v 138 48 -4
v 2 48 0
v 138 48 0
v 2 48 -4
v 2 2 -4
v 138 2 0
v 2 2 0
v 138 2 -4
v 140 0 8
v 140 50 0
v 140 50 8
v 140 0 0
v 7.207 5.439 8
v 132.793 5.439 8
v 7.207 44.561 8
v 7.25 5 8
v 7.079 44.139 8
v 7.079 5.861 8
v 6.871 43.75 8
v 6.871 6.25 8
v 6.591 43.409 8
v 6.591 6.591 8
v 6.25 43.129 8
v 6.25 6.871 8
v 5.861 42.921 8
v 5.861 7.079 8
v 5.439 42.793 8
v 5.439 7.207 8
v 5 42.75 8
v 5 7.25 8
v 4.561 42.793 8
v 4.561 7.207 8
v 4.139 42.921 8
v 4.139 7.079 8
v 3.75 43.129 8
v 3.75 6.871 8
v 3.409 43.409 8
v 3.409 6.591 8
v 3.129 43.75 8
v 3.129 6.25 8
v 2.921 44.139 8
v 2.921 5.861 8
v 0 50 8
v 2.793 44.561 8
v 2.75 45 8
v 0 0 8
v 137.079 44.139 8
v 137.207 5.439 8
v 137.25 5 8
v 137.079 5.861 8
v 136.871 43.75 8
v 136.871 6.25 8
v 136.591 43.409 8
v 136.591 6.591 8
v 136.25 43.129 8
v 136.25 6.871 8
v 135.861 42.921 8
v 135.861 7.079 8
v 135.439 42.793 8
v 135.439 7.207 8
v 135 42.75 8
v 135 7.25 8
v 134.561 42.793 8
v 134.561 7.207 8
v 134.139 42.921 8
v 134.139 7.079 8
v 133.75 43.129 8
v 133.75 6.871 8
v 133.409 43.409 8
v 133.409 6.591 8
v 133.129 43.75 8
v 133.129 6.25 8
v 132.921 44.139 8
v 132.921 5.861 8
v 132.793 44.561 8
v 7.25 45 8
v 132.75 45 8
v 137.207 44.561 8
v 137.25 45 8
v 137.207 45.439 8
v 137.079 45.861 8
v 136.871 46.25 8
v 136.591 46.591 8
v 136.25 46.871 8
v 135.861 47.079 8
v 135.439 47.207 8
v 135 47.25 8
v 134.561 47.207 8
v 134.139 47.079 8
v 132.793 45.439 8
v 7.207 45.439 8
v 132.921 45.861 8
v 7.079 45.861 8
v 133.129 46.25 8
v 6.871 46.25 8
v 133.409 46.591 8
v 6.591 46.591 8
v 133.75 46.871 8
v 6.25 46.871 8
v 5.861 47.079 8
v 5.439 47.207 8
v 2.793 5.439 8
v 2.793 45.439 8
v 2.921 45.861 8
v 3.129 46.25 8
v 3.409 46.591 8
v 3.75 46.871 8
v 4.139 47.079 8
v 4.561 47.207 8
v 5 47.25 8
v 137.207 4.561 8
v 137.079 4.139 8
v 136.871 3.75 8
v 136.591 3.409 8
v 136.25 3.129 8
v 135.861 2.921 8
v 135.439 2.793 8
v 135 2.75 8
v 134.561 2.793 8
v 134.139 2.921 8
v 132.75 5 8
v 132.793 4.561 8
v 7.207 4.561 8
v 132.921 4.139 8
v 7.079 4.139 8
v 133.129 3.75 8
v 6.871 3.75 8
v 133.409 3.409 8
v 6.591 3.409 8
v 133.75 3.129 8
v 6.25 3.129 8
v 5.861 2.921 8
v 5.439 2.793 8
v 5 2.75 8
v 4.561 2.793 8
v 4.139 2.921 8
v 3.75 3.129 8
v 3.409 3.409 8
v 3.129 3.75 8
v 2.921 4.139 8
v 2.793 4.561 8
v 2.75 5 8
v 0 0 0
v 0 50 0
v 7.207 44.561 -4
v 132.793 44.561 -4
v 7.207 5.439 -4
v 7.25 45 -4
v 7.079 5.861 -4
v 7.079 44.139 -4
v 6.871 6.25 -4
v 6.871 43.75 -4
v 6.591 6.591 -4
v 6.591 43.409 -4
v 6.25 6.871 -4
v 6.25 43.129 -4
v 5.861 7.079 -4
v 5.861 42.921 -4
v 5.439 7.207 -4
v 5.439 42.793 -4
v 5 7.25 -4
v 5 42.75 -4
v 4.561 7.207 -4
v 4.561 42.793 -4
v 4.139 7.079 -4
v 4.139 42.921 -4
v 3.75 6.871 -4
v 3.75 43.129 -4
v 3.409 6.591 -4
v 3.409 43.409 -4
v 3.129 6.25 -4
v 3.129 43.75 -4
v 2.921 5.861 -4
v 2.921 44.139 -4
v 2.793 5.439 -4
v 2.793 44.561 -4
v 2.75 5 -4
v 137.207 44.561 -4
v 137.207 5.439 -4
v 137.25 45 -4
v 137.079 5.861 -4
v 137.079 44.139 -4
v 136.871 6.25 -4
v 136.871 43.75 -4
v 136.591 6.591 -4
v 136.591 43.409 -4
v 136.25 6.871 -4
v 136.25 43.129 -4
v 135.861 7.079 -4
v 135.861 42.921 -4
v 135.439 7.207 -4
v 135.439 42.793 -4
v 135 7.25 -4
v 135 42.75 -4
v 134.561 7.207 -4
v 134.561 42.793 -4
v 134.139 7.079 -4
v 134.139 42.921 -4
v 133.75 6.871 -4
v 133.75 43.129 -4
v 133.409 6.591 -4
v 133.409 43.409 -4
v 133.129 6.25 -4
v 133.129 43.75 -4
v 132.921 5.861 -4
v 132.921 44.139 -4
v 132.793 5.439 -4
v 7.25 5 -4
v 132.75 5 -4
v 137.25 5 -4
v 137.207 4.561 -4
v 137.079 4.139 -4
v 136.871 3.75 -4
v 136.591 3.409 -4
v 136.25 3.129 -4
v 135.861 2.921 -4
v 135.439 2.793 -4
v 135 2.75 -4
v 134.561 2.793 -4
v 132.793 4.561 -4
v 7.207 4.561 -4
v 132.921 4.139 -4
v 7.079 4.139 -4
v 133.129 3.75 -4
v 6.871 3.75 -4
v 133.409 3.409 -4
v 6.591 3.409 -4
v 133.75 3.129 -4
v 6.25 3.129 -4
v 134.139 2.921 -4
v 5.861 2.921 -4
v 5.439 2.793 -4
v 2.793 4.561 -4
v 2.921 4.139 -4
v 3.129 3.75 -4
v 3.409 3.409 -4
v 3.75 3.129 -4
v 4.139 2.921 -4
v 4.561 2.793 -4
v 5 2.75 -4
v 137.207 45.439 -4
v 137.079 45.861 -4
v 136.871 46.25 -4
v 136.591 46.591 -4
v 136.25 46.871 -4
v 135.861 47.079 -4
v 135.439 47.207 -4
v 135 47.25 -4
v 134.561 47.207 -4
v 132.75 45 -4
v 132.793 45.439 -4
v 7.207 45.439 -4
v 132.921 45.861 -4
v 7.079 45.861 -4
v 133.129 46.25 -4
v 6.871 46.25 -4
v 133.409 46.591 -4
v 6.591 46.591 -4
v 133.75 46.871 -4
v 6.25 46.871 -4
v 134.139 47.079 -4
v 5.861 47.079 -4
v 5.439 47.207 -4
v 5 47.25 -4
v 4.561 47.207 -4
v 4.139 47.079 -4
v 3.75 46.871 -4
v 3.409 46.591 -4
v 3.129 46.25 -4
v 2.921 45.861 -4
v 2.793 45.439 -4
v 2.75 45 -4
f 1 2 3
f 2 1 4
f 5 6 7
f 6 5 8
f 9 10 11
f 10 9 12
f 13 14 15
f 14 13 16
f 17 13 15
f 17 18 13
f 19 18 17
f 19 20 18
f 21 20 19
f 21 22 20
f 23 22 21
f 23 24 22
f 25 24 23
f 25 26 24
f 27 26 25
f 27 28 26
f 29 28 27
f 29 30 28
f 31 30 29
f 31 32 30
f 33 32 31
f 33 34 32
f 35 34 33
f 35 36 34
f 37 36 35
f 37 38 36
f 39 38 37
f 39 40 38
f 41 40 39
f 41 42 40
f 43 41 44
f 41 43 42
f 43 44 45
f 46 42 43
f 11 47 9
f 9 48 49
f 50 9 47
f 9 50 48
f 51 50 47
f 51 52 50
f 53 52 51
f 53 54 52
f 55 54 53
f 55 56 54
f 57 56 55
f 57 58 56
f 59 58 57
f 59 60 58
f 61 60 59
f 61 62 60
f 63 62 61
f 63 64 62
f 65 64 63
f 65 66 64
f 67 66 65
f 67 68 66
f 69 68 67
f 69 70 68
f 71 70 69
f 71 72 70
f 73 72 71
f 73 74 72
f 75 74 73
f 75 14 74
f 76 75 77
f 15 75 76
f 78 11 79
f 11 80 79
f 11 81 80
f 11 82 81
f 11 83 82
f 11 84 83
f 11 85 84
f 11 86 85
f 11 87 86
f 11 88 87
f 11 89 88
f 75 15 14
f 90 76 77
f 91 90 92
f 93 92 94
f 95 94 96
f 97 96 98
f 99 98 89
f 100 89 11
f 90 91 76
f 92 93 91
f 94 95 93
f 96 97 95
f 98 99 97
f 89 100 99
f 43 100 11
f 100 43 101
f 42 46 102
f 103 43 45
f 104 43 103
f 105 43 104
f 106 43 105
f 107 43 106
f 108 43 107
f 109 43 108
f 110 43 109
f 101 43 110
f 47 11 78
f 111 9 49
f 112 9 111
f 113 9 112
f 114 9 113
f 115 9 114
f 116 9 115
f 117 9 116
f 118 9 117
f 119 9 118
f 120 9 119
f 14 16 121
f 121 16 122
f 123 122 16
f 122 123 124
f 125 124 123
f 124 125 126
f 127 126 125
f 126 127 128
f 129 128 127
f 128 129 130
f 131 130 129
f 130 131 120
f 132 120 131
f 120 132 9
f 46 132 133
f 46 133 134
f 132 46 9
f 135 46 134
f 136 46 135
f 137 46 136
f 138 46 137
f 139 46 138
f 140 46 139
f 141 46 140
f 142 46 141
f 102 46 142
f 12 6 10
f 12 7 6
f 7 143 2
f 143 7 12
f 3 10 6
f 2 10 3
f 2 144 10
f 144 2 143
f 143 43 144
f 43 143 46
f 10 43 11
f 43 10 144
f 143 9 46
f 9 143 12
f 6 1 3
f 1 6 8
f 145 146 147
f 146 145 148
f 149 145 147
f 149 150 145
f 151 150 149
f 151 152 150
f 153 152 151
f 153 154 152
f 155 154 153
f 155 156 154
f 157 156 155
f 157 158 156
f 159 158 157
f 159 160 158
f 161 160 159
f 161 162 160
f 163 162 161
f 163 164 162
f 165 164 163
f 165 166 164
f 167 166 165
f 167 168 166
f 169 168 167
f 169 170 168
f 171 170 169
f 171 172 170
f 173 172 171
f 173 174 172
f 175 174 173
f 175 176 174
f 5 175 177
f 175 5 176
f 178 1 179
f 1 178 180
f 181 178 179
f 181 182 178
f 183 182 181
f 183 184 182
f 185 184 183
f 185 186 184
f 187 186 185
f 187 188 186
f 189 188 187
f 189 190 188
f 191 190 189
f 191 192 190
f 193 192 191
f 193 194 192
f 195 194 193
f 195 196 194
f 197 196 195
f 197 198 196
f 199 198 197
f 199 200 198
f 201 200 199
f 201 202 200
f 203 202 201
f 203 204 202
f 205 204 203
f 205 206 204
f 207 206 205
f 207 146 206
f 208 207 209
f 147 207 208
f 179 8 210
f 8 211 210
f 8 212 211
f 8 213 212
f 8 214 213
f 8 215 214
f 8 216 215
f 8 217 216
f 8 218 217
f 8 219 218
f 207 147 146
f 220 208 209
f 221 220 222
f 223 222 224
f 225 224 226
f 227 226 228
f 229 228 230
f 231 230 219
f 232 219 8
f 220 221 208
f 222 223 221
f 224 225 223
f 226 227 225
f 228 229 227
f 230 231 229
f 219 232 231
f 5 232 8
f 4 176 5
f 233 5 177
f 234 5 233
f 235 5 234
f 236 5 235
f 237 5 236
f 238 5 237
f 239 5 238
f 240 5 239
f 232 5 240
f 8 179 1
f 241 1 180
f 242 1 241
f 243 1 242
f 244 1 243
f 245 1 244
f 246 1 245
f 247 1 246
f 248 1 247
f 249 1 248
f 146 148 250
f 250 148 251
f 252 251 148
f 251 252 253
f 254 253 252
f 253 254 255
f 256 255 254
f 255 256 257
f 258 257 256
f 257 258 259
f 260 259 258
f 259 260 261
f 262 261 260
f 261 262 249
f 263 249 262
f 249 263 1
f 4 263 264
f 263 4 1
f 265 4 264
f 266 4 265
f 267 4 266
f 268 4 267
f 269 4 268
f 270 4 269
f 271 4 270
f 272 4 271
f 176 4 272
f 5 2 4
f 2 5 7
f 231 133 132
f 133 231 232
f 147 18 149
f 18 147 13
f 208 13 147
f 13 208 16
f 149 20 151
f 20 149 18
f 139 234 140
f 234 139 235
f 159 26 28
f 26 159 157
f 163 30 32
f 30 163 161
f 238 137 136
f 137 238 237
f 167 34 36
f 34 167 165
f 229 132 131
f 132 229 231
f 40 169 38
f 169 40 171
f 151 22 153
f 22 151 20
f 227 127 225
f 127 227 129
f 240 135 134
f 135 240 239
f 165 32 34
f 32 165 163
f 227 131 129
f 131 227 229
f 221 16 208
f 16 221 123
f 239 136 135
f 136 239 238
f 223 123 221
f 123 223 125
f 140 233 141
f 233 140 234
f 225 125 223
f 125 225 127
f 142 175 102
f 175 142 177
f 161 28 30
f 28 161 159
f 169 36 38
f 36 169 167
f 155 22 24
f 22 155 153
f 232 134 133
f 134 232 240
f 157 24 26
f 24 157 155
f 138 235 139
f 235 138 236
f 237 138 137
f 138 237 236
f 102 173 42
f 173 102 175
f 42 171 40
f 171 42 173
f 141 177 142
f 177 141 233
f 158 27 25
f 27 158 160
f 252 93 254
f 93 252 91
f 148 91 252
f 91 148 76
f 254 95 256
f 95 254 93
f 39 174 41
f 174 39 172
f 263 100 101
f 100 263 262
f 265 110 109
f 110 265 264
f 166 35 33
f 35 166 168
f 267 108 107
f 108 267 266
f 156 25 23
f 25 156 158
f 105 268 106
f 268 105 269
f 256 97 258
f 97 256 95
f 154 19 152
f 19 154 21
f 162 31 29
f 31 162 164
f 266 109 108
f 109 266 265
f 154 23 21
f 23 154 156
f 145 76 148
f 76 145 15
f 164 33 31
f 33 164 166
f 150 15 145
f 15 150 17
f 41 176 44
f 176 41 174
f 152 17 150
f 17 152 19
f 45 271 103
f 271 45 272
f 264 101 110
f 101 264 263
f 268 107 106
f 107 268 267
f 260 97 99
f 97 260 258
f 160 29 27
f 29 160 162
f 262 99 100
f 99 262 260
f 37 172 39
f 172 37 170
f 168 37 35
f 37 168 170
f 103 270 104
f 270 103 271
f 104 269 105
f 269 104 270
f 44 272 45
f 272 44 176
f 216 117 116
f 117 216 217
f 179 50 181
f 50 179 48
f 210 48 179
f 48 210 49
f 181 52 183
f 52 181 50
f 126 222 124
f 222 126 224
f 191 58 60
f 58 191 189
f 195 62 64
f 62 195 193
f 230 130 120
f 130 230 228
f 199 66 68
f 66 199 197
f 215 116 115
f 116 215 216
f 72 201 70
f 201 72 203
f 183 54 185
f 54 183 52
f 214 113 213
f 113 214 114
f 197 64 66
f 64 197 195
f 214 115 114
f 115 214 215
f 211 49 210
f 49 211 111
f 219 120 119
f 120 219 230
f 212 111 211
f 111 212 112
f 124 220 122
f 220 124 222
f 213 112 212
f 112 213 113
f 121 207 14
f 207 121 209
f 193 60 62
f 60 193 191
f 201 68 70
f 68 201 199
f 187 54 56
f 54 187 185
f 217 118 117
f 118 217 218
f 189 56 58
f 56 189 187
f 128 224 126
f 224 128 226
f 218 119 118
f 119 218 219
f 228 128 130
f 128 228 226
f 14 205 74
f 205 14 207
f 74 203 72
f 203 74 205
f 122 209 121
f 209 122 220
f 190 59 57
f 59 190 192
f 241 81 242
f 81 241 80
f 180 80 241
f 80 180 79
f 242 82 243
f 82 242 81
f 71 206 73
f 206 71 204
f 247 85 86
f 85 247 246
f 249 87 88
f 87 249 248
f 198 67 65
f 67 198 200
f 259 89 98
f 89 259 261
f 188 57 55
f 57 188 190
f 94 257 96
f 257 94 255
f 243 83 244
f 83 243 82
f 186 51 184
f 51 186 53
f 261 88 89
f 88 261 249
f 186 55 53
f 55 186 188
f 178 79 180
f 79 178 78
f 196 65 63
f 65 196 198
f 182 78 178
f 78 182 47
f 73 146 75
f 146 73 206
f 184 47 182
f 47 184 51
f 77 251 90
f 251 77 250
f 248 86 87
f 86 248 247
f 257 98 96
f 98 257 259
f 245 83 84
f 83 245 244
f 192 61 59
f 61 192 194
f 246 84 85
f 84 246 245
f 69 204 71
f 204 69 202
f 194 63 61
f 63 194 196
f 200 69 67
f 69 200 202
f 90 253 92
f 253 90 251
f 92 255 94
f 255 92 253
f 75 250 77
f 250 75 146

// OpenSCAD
$fn = 32;

// ----------------------------------------------------------------------
// Enclosure lid: 140 x 50 x 8 mm, 4 bolt holes
// ----------------------------------------------------------------------

// --- parameters (mm) ---
length = 140;             // lid length, X
width = 50;               // lid width, Y
plate_t = 8;              // lid plate thickness
bolt_d = 4.5;             // bolt clearance
boss_lip = 5;             // bolt hole inset from the corner
sink = 1;                 // overlap of the lip and ribs into the plate
lip_h = 5;                // lip height below the plate
lip_wall = 2;             // lip wall thickness
rib_n = 3;                // stiffening ribs
rib_t = 2;                // rib thickness
rib_h = 4;                // rib height below the plate

module plate() {
  cube([length, width, plate_t]);
  /* lip that drops into the housing opening, sunk into the plate */
  translate([lip_wall, lip_wall, -lip_h + sink]) cube([length - 2 * lip_wall, width - 2 * lip_wall, lip_h]);
  /* stiffening ribs under the plate */
  for (i = [1 : rib_n]) translate([length * i / (rib_n + 1) - rib_t / 2, lip_wall, -rib_h + sink]) cube([rib_t, width - 2 * lip_wall, rib_h]);
}

difference() {
  plate();
  /* bolt pattern matching the corner bosses */
  for (sx = [0, 1]) for (sy = [0, 1])
    translate([sx * (length - 2 * boss_lip) + boss_lip, sy * (width - 2 * boss_lip) + boss_lip, -lip_h - 1])
      cylinder(h = plate_t + lip_h + 2, d = bolt_d);
}
